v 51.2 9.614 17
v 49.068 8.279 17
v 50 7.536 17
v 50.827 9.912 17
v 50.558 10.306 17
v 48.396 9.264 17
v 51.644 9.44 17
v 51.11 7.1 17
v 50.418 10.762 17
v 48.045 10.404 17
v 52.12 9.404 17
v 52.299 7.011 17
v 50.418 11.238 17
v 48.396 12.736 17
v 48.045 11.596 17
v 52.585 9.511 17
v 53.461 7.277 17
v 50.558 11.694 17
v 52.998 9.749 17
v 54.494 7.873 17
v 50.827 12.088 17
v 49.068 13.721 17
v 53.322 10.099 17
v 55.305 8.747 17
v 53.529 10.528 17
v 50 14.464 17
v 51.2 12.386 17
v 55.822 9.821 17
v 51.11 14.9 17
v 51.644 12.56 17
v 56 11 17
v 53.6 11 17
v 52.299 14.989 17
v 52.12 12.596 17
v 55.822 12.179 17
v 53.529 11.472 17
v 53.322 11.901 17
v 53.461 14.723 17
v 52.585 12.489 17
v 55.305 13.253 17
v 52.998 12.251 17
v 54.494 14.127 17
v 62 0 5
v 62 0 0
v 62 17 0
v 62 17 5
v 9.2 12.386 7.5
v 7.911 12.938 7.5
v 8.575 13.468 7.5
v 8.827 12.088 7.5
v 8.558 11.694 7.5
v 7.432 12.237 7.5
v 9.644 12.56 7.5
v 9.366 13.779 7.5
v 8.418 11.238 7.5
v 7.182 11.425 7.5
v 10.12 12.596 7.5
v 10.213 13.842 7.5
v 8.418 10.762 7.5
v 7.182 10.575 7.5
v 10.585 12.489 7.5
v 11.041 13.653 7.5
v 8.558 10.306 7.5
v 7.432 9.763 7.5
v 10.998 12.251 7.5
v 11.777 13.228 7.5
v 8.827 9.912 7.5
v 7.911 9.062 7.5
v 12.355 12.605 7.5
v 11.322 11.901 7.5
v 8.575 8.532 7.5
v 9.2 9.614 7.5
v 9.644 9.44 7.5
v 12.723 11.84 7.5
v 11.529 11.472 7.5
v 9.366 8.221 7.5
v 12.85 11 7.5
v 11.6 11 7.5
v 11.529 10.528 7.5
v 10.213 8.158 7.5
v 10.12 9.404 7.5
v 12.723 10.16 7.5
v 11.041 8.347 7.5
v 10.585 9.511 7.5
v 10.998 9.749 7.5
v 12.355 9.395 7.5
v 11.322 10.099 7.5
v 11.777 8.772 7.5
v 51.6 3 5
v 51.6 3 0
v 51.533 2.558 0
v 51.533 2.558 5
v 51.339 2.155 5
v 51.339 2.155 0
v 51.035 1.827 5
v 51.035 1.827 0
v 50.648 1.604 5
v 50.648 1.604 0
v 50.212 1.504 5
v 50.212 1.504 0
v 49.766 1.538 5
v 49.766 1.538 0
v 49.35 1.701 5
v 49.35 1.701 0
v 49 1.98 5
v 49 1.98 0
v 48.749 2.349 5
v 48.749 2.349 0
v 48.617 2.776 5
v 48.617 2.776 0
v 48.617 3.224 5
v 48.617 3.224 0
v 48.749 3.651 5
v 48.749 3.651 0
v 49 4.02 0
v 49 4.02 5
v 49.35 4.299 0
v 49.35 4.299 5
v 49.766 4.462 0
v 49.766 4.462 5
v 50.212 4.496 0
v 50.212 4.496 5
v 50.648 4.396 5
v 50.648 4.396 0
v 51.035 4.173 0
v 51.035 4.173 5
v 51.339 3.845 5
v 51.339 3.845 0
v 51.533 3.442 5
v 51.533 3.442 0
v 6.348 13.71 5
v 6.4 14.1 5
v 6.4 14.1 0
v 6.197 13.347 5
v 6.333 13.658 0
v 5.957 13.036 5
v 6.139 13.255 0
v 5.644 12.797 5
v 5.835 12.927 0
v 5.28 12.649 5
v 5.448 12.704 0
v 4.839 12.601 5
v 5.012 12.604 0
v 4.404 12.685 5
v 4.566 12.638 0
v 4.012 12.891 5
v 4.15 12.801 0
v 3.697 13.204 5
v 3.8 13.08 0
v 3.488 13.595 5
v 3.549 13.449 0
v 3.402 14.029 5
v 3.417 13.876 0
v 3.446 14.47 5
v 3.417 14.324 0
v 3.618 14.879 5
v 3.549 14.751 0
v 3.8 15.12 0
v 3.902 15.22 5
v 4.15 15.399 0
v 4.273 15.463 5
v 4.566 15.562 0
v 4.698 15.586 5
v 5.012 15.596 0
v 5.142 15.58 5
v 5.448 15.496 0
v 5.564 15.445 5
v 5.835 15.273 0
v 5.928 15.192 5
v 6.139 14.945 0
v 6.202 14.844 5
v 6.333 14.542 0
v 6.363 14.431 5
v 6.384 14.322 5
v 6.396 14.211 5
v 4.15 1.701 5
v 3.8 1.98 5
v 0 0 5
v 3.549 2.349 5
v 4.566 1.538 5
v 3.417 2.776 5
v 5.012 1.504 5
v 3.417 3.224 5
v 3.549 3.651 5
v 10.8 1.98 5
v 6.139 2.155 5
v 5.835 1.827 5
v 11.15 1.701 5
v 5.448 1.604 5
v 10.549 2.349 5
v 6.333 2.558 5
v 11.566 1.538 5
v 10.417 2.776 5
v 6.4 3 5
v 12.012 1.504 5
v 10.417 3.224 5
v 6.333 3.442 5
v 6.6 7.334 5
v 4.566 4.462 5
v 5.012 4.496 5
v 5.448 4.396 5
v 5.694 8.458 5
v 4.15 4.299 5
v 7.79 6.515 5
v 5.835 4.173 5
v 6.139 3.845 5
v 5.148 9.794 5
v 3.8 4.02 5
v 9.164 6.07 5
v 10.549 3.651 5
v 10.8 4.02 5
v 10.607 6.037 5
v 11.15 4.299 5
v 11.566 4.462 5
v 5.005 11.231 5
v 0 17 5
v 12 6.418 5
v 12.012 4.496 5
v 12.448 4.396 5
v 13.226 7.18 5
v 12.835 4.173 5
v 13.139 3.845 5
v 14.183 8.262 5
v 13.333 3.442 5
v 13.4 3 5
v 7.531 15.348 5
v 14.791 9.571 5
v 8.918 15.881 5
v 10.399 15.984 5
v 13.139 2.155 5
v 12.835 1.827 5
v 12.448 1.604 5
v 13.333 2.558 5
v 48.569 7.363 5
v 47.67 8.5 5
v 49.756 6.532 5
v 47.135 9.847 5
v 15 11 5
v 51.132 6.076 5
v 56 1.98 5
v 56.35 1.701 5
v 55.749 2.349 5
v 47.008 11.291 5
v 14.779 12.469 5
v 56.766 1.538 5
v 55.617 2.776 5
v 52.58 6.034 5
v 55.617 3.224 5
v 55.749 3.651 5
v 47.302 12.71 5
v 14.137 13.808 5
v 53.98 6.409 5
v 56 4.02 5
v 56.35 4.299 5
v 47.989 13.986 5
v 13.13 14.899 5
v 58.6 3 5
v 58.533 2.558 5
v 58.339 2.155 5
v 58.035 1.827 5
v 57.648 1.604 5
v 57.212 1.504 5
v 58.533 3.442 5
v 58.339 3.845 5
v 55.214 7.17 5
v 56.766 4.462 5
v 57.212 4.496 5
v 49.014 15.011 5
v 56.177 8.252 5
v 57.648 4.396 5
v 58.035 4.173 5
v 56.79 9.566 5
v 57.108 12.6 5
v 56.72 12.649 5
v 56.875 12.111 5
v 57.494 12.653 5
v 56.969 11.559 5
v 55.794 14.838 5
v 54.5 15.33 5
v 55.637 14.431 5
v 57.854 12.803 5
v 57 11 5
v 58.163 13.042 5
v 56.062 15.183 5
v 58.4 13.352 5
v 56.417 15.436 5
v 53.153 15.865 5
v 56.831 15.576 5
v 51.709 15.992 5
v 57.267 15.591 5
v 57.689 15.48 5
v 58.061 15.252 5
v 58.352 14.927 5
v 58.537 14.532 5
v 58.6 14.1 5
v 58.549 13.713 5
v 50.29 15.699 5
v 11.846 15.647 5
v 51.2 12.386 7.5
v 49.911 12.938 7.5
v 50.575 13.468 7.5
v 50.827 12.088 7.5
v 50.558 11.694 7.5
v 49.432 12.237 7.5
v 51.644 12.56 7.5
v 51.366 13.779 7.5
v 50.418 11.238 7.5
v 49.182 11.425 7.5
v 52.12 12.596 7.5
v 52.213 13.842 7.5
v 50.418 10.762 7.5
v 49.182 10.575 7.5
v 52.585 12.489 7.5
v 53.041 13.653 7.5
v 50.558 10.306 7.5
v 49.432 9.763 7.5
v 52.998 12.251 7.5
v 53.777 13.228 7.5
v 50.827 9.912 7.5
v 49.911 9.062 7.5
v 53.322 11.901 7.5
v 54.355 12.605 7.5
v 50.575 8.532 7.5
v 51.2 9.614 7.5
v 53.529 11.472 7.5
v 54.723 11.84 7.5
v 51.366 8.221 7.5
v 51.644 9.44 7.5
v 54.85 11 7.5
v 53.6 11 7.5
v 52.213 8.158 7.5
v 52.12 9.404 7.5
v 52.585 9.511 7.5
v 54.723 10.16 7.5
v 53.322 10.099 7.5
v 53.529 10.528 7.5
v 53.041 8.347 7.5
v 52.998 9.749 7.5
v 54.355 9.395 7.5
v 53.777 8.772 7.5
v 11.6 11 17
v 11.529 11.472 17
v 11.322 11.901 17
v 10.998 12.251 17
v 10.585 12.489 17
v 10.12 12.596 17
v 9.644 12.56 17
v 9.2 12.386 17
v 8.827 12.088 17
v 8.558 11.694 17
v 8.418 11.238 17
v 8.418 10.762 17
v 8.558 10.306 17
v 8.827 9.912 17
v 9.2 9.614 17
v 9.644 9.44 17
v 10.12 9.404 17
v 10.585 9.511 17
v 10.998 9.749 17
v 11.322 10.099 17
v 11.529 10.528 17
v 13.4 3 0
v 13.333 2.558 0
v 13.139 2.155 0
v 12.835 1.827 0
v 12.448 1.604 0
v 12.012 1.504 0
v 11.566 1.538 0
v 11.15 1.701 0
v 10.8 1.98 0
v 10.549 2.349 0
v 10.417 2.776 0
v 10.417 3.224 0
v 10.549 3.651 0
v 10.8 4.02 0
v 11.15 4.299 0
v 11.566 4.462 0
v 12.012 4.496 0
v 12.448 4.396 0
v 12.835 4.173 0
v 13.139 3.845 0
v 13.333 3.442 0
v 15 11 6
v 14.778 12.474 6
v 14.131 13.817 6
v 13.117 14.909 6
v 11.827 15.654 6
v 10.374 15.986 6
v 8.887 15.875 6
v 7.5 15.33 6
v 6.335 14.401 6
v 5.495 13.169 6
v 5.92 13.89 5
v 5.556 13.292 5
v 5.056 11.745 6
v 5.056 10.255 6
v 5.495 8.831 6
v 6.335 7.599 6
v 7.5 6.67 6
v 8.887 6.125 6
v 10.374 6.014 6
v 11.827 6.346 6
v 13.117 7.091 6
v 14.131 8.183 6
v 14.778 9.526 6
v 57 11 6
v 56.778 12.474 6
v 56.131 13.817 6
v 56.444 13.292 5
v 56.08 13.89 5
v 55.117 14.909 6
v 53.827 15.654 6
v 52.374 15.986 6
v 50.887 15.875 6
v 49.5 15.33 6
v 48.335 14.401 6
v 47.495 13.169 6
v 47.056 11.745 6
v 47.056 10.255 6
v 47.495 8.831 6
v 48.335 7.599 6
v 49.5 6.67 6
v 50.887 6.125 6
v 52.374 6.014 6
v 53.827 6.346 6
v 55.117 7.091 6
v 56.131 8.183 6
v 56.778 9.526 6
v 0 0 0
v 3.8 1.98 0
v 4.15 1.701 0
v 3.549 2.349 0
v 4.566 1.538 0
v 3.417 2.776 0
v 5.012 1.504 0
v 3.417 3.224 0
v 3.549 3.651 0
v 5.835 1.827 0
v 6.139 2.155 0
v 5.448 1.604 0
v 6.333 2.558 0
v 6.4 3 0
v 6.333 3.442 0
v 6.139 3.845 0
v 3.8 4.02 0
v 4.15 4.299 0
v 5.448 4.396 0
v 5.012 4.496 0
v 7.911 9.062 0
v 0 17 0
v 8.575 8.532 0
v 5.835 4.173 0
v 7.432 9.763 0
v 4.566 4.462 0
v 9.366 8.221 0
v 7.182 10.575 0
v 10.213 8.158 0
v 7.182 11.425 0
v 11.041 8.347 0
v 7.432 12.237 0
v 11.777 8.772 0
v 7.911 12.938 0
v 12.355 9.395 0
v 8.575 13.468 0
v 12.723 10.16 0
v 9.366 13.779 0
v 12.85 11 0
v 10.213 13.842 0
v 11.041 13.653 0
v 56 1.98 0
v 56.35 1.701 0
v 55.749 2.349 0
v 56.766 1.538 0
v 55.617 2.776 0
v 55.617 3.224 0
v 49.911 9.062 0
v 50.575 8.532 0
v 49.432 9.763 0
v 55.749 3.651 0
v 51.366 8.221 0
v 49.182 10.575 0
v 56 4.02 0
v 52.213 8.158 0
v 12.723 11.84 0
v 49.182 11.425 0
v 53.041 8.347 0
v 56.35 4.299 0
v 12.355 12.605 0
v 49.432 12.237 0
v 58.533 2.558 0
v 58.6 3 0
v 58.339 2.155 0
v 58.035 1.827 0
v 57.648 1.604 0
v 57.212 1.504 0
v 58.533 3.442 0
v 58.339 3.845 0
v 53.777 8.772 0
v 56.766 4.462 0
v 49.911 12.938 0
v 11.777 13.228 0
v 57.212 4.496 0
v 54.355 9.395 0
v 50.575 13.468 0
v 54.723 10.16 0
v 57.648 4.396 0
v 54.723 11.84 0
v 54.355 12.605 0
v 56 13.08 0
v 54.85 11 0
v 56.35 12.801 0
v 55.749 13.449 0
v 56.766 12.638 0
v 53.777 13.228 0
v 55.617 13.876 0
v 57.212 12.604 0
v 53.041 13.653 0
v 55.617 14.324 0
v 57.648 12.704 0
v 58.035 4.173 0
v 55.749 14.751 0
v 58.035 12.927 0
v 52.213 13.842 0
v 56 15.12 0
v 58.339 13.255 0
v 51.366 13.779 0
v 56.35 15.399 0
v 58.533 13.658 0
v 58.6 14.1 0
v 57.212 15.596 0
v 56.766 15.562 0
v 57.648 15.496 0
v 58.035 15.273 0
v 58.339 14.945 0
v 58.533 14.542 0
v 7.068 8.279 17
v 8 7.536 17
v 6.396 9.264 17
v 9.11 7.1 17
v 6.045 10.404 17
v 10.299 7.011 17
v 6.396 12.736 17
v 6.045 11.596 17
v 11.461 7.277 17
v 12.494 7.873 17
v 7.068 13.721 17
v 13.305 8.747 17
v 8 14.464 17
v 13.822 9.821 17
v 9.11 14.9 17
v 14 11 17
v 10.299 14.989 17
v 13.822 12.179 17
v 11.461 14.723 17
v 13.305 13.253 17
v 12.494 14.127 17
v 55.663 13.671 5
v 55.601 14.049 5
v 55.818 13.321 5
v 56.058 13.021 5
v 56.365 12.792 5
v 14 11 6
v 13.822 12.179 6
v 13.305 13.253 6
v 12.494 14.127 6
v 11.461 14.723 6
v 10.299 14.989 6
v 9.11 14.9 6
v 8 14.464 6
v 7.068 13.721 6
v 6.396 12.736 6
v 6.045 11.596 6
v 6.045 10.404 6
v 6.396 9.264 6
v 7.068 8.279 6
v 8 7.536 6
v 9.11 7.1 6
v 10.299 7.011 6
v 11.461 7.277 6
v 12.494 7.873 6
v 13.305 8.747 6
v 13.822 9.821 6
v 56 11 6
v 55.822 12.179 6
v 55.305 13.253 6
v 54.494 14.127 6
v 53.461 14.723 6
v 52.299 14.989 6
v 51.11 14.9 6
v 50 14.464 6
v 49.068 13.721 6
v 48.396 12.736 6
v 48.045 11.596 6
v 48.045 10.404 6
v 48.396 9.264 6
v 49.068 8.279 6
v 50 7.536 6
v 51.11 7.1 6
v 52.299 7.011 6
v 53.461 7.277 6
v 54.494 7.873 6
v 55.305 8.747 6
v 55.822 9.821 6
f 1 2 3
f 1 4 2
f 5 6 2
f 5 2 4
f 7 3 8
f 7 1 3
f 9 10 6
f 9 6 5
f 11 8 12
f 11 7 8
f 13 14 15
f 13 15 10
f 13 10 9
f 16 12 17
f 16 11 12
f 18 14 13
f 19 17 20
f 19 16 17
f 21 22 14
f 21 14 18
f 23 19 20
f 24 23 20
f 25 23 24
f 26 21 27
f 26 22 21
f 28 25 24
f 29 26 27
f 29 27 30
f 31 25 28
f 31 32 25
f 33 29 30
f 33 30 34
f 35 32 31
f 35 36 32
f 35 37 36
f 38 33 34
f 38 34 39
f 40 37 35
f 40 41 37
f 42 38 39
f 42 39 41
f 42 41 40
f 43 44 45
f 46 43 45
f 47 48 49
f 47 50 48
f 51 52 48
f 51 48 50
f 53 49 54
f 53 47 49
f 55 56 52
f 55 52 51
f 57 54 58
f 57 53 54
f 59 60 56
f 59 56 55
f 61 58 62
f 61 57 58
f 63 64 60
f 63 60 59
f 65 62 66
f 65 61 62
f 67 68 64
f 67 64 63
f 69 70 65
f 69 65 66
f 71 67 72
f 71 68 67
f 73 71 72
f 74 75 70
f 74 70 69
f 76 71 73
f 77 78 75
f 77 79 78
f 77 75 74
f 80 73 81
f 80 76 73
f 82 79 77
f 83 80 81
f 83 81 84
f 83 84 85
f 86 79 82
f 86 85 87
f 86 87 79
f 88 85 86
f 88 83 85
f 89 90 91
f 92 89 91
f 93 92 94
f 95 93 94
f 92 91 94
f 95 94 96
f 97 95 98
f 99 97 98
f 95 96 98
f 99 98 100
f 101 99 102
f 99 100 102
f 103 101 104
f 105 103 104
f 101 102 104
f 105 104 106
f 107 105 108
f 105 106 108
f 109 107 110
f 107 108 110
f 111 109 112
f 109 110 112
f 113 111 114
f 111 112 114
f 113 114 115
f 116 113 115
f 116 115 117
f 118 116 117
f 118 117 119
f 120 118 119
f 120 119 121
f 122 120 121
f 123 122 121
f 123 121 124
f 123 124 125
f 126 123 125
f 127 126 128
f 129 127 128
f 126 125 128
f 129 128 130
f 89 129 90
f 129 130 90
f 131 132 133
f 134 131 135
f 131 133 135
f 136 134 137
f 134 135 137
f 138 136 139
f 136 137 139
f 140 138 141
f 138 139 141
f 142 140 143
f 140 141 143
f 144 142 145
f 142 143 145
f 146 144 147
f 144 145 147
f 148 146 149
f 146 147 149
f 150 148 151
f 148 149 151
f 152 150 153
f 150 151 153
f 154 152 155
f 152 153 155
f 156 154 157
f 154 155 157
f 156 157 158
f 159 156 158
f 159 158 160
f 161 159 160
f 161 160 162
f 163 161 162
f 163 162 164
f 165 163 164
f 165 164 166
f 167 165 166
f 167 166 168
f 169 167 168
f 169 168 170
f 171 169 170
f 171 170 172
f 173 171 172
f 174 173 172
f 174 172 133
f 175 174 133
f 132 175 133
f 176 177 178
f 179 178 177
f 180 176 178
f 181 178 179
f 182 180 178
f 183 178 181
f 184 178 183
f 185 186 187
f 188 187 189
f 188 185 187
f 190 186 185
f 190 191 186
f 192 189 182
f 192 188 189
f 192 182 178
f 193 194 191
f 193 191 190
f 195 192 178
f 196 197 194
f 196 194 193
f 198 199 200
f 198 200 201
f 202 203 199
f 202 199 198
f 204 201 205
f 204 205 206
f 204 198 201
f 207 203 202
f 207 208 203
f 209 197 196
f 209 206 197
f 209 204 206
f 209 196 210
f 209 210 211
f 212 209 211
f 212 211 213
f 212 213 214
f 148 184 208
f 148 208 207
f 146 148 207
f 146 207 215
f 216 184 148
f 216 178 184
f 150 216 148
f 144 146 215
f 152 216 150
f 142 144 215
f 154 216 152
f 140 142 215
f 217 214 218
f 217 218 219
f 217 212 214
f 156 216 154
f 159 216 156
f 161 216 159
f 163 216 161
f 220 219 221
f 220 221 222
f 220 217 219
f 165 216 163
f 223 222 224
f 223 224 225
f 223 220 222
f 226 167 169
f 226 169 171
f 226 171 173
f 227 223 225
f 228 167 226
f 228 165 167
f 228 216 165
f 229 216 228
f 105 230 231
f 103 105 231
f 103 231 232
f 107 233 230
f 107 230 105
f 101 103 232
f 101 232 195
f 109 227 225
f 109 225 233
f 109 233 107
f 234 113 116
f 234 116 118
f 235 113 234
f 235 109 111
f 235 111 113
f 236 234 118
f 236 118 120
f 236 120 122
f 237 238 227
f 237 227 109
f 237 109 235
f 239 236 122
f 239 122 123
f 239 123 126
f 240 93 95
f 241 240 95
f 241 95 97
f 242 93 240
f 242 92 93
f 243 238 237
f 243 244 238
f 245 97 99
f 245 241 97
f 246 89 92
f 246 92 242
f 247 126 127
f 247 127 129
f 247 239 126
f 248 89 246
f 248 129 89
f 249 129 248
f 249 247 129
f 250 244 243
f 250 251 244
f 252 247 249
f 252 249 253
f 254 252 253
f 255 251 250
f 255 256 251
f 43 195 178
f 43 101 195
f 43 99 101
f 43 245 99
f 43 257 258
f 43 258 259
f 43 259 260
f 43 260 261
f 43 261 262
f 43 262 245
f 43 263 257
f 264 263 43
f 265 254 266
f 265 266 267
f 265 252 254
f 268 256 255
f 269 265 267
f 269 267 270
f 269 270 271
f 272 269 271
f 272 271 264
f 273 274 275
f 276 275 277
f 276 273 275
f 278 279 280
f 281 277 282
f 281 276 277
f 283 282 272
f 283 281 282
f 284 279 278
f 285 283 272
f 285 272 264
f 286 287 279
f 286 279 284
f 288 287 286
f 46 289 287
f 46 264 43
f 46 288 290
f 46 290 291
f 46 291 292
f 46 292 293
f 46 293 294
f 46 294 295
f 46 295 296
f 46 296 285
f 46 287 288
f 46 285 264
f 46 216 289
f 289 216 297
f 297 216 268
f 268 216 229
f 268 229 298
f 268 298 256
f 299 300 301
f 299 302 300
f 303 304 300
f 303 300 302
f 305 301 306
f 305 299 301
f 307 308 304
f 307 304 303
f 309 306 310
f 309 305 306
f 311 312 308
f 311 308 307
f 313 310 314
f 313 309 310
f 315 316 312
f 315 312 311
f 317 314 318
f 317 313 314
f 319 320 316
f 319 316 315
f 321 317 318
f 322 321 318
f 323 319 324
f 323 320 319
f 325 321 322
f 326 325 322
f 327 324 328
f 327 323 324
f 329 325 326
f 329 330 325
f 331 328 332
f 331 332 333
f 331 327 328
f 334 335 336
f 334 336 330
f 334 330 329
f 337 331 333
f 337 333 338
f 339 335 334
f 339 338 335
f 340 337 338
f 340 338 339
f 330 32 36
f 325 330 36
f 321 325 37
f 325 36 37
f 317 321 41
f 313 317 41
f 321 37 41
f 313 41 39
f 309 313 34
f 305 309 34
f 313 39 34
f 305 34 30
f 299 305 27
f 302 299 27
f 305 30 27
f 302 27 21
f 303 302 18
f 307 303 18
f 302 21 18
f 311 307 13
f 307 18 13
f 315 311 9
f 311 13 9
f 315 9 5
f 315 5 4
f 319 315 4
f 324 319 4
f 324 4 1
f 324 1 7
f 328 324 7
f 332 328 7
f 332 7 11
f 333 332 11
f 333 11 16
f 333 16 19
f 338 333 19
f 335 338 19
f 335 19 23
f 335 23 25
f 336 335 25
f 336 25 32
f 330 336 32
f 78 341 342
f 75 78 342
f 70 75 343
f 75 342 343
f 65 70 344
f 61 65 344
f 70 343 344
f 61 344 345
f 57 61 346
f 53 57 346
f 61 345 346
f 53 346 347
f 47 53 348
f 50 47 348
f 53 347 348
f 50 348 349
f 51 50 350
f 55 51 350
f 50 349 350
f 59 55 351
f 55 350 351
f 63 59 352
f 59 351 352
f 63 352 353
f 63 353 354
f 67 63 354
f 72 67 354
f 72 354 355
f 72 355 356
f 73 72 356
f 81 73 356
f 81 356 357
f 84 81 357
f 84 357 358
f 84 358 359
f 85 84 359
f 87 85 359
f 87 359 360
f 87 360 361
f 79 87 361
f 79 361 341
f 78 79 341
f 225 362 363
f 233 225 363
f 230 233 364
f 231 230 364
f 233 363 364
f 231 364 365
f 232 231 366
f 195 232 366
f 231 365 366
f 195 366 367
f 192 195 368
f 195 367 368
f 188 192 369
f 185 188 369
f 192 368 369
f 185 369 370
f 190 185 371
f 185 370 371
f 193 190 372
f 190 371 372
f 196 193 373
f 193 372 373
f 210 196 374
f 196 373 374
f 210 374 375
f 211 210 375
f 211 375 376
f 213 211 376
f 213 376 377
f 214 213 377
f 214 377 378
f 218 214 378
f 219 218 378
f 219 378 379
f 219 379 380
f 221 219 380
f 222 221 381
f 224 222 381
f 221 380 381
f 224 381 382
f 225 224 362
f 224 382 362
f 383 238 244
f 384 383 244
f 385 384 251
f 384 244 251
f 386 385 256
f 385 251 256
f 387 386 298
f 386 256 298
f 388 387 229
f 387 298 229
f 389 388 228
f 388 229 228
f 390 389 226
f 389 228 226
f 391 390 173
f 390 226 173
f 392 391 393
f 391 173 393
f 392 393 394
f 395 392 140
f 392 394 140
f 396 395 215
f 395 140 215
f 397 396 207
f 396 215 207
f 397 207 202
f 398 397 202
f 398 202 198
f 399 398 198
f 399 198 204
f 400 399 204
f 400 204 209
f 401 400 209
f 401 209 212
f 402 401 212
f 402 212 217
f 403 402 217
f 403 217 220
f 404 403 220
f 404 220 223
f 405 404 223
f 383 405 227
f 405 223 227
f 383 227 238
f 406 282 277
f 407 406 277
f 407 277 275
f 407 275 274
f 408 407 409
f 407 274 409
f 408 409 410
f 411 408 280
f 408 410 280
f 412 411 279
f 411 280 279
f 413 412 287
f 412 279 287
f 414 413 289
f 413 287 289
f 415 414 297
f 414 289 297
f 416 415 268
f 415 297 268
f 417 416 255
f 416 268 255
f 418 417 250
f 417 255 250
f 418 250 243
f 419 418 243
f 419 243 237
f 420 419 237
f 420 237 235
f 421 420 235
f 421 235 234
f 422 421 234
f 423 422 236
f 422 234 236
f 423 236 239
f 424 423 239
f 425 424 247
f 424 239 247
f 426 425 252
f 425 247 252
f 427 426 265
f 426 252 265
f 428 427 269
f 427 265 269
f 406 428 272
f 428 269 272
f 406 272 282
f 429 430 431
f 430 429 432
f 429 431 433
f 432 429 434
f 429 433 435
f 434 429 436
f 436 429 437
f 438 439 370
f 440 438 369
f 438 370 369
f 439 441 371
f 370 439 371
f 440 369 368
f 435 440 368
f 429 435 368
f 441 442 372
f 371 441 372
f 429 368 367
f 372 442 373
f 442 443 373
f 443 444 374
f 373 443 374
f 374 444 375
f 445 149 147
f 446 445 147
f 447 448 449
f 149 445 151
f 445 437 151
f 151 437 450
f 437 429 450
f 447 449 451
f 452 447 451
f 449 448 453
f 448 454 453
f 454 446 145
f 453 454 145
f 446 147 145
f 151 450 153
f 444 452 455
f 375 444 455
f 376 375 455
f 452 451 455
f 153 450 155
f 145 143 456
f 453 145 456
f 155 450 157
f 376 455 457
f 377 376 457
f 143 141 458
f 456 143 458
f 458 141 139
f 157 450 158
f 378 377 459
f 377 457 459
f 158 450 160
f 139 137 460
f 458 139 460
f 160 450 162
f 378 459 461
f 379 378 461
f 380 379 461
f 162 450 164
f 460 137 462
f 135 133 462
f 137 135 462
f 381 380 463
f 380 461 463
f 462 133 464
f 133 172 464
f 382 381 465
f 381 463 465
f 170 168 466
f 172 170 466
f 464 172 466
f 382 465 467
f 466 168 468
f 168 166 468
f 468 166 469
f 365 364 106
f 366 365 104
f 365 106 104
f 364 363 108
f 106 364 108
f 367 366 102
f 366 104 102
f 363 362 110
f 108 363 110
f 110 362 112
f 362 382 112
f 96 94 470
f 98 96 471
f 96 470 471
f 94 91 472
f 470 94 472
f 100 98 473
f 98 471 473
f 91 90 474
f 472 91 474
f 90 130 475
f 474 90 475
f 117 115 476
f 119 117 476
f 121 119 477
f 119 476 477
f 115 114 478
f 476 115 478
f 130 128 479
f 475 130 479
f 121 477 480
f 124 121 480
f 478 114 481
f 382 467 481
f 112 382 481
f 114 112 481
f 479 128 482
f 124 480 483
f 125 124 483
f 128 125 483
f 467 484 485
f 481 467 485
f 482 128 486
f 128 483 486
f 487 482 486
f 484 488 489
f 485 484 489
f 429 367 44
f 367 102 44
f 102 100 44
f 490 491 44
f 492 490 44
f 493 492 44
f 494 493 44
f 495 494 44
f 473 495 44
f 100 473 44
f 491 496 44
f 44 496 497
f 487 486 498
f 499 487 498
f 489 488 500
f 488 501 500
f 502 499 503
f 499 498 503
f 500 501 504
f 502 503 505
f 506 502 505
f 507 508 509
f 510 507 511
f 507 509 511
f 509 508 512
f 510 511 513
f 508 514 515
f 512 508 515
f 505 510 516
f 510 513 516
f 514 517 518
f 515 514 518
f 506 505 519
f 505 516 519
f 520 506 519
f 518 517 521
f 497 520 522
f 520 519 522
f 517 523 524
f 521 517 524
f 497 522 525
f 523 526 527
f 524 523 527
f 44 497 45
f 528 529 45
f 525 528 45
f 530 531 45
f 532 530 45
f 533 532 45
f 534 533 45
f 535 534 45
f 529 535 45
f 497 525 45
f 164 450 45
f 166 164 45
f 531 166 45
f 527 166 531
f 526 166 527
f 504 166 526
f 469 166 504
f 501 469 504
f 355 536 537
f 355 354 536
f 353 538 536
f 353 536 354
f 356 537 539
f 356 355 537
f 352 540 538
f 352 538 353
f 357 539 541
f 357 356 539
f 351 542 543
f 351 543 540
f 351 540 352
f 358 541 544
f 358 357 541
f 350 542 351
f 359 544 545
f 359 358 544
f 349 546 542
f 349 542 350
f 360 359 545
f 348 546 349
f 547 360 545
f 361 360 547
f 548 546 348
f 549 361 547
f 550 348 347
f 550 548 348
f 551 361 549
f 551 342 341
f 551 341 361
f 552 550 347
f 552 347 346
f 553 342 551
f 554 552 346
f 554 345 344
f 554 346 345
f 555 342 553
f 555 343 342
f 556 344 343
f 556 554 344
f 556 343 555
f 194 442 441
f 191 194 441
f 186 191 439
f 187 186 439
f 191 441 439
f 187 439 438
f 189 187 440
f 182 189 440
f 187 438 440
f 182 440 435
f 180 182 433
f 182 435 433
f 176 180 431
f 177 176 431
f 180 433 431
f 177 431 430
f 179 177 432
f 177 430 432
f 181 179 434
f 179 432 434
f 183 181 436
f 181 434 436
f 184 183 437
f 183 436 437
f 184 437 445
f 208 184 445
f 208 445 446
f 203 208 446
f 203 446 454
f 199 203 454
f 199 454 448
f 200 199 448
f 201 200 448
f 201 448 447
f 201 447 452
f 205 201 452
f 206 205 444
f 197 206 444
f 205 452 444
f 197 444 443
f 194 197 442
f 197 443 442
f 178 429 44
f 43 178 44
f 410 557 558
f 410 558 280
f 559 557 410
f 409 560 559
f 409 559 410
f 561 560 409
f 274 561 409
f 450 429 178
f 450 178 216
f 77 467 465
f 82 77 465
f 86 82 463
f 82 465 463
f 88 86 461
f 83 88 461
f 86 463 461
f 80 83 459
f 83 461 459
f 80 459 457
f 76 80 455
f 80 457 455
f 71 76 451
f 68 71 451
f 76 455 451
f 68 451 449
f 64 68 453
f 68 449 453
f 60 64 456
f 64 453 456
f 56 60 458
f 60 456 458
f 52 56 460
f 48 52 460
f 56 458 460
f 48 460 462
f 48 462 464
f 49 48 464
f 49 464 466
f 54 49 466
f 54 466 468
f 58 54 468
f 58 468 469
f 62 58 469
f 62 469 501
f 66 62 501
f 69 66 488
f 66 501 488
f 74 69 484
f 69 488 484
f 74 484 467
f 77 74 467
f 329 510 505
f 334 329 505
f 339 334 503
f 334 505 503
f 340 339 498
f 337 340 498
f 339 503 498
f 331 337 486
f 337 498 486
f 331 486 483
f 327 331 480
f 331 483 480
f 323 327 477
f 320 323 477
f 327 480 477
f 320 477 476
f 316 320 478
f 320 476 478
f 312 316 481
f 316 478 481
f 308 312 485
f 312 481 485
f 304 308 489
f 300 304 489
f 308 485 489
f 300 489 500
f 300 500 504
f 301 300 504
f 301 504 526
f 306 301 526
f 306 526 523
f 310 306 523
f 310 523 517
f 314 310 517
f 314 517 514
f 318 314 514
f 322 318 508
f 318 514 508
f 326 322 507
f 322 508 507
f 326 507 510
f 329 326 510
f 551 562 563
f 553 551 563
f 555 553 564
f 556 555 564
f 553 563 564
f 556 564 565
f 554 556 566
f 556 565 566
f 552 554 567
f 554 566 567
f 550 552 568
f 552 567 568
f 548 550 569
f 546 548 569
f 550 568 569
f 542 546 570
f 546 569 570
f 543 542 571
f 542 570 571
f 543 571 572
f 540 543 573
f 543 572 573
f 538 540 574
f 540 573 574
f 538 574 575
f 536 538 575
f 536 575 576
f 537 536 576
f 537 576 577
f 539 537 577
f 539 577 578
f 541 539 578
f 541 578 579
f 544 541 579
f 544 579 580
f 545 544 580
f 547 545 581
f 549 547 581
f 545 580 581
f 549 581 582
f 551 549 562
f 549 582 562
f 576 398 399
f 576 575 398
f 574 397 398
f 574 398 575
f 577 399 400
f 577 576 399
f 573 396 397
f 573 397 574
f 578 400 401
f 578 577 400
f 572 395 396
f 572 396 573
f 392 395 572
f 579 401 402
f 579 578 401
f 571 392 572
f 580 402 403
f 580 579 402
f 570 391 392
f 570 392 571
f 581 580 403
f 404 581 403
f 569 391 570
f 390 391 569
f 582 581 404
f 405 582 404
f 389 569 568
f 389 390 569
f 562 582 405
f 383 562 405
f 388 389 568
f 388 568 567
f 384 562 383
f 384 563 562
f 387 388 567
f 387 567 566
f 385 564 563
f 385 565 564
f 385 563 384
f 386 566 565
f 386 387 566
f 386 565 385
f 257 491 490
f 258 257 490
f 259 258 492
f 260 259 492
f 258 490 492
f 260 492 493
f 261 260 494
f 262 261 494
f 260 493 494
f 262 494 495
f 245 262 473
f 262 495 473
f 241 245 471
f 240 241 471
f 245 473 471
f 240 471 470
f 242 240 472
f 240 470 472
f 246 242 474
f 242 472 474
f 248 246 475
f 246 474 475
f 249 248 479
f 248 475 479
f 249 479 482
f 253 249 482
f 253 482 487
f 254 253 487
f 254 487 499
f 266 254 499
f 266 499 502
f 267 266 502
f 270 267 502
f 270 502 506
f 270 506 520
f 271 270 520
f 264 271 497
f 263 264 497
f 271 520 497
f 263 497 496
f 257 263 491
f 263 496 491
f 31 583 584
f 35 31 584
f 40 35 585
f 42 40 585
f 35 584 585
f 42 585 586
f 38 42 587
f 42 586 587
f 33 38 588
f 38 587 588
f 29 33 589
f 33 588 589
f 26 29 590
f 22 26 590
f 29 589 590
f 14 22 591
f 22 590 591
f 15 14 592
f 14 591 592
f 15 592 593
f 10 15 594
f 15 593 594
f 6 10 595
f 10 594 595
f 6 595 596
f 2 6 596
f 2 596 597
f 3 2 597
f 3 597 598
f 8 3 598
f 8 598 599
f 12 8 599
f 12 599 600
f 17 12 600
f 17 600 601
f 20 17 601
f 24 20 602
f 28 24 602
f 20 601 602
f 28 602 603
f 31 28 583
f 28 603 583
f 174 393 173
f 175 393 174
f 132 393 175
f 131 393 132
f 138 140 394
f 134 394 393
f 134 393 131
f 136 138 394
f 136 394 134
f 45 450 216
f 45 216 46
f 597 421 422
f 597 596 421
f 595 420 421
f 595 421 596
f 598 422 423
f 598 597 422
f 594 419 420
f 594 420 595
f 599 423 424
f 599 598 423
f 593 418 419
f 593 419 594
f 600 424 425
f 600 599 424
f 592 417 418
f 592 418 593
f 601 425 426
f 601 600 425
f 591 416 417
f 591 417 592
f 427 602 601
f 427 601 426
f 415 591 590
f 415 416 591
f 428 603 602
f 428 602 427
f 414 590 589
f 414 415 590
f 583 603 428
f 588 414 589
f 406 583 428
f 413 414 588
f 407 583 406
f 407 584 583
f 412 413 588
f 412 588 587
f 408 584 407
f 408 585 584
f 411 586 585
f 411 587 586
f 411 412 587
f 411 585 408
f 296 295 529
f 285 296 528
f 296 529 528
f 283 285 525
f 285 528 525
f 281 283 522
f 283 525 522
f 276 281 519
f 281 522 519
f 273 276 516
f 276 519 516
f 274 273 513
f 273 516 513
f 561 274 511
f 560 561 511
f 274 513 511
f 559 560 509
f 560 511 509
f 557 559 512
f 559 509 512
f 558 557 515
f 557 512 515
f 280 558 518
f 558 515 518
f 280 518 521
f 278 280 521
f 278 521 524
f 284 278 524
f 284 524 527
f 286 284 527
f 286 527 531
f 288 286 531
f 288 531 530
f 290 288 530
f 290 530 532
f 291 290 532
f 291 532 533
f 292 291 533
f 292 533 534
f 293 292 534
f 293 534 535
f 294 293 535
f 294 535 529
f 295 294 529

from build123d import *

# Parameters (mm, degrees)
F0_W      = 62
F0_H      = 17
F1_DEPTH  = 5
F2_R      = 5
F3_DEPTH  = 1
F4_R      = 4
F5_DEPTH  = 11
F6_R      = 2.85
F7_DEPTH  = 7.5
F8_R      = 1.6
F9_DEPTH  = 25
F10_R     = 1.5
F11_DEPTH = 5


with BuildPart() as f1:
    # F0 (on Top) → F1 (new body)
    with BuildSketch(Plane.XY):
        with Locations((31, 8.5)):
            Rectangle(F0_W, F0_H)
    extrude(amount=F1_DEPTH)

    # F2 (on face) → F3 (join)
    with BuildSketch(Plane.XY.offset(5)):
        with Locations((10, 11)):
            Circle(F2_R)
        with Locations((52, 11)):
            Circle(F2_R)
    extrude(amount=F3_DEPTH)

    # F4 (on face) → F5 (join)
    with BuildSketch(Plane.XY.offset(6)):
        with Locations((52, 11)):
            Circle(F4_R)
        with Locations((10, 11)):
            Circle(F4_R)
    extrude(amount=F5_DEPTH)

    # F6 (on face) → F7 (cut)
    with BuildSketch(Plane(origin=(0, 0, 0), x_dir=(1, 0, 0), z_dir=(0, 0, -1))):
        with Locations((52, -11)):
            Circle(F6_R)
        with Locations((10, -11)):
            Circle(F6_R)
    extrude(amount=-F7_DEPTH, mode=Mode.SUBTRACT)

    # F8 (on face) → F9 (cut)
    with BuildSketch(Plane.XY.offset(17)):
        with Locations((52, 11)):
            Circle(F8_R)
        with Locations((10, 11)):
            Circle(F8_R)
    extrude(amount=-F9_DEPTH, mode=Mode.SUBTRACT)

    # F10 (on face) → F11 (cut, through all)
    with BuildSketch(Plane(origin=(0, 0, 0), x_dir=(1, 0, 0), z_dir=(0, 0, -1))):
        with Locations((57.1, -14.1)):
            Circle(F10_R)
        with Locations((50.1, -3)):
            Circle(F10_R)
        with Locations((11.9, -3)):
            Circle(F10_R)
        with Locations((4.9, -14.1)):
            Circle(F10_R)
        with Locations((57.1, -3)):
            Circle(F10_R)
        with Locations((4.9, -3)):
            Circle(F10_R)
    extrude(amount=-F11_DEPTH, mode=Mode.SUBTRACT)


solid = f1.part
